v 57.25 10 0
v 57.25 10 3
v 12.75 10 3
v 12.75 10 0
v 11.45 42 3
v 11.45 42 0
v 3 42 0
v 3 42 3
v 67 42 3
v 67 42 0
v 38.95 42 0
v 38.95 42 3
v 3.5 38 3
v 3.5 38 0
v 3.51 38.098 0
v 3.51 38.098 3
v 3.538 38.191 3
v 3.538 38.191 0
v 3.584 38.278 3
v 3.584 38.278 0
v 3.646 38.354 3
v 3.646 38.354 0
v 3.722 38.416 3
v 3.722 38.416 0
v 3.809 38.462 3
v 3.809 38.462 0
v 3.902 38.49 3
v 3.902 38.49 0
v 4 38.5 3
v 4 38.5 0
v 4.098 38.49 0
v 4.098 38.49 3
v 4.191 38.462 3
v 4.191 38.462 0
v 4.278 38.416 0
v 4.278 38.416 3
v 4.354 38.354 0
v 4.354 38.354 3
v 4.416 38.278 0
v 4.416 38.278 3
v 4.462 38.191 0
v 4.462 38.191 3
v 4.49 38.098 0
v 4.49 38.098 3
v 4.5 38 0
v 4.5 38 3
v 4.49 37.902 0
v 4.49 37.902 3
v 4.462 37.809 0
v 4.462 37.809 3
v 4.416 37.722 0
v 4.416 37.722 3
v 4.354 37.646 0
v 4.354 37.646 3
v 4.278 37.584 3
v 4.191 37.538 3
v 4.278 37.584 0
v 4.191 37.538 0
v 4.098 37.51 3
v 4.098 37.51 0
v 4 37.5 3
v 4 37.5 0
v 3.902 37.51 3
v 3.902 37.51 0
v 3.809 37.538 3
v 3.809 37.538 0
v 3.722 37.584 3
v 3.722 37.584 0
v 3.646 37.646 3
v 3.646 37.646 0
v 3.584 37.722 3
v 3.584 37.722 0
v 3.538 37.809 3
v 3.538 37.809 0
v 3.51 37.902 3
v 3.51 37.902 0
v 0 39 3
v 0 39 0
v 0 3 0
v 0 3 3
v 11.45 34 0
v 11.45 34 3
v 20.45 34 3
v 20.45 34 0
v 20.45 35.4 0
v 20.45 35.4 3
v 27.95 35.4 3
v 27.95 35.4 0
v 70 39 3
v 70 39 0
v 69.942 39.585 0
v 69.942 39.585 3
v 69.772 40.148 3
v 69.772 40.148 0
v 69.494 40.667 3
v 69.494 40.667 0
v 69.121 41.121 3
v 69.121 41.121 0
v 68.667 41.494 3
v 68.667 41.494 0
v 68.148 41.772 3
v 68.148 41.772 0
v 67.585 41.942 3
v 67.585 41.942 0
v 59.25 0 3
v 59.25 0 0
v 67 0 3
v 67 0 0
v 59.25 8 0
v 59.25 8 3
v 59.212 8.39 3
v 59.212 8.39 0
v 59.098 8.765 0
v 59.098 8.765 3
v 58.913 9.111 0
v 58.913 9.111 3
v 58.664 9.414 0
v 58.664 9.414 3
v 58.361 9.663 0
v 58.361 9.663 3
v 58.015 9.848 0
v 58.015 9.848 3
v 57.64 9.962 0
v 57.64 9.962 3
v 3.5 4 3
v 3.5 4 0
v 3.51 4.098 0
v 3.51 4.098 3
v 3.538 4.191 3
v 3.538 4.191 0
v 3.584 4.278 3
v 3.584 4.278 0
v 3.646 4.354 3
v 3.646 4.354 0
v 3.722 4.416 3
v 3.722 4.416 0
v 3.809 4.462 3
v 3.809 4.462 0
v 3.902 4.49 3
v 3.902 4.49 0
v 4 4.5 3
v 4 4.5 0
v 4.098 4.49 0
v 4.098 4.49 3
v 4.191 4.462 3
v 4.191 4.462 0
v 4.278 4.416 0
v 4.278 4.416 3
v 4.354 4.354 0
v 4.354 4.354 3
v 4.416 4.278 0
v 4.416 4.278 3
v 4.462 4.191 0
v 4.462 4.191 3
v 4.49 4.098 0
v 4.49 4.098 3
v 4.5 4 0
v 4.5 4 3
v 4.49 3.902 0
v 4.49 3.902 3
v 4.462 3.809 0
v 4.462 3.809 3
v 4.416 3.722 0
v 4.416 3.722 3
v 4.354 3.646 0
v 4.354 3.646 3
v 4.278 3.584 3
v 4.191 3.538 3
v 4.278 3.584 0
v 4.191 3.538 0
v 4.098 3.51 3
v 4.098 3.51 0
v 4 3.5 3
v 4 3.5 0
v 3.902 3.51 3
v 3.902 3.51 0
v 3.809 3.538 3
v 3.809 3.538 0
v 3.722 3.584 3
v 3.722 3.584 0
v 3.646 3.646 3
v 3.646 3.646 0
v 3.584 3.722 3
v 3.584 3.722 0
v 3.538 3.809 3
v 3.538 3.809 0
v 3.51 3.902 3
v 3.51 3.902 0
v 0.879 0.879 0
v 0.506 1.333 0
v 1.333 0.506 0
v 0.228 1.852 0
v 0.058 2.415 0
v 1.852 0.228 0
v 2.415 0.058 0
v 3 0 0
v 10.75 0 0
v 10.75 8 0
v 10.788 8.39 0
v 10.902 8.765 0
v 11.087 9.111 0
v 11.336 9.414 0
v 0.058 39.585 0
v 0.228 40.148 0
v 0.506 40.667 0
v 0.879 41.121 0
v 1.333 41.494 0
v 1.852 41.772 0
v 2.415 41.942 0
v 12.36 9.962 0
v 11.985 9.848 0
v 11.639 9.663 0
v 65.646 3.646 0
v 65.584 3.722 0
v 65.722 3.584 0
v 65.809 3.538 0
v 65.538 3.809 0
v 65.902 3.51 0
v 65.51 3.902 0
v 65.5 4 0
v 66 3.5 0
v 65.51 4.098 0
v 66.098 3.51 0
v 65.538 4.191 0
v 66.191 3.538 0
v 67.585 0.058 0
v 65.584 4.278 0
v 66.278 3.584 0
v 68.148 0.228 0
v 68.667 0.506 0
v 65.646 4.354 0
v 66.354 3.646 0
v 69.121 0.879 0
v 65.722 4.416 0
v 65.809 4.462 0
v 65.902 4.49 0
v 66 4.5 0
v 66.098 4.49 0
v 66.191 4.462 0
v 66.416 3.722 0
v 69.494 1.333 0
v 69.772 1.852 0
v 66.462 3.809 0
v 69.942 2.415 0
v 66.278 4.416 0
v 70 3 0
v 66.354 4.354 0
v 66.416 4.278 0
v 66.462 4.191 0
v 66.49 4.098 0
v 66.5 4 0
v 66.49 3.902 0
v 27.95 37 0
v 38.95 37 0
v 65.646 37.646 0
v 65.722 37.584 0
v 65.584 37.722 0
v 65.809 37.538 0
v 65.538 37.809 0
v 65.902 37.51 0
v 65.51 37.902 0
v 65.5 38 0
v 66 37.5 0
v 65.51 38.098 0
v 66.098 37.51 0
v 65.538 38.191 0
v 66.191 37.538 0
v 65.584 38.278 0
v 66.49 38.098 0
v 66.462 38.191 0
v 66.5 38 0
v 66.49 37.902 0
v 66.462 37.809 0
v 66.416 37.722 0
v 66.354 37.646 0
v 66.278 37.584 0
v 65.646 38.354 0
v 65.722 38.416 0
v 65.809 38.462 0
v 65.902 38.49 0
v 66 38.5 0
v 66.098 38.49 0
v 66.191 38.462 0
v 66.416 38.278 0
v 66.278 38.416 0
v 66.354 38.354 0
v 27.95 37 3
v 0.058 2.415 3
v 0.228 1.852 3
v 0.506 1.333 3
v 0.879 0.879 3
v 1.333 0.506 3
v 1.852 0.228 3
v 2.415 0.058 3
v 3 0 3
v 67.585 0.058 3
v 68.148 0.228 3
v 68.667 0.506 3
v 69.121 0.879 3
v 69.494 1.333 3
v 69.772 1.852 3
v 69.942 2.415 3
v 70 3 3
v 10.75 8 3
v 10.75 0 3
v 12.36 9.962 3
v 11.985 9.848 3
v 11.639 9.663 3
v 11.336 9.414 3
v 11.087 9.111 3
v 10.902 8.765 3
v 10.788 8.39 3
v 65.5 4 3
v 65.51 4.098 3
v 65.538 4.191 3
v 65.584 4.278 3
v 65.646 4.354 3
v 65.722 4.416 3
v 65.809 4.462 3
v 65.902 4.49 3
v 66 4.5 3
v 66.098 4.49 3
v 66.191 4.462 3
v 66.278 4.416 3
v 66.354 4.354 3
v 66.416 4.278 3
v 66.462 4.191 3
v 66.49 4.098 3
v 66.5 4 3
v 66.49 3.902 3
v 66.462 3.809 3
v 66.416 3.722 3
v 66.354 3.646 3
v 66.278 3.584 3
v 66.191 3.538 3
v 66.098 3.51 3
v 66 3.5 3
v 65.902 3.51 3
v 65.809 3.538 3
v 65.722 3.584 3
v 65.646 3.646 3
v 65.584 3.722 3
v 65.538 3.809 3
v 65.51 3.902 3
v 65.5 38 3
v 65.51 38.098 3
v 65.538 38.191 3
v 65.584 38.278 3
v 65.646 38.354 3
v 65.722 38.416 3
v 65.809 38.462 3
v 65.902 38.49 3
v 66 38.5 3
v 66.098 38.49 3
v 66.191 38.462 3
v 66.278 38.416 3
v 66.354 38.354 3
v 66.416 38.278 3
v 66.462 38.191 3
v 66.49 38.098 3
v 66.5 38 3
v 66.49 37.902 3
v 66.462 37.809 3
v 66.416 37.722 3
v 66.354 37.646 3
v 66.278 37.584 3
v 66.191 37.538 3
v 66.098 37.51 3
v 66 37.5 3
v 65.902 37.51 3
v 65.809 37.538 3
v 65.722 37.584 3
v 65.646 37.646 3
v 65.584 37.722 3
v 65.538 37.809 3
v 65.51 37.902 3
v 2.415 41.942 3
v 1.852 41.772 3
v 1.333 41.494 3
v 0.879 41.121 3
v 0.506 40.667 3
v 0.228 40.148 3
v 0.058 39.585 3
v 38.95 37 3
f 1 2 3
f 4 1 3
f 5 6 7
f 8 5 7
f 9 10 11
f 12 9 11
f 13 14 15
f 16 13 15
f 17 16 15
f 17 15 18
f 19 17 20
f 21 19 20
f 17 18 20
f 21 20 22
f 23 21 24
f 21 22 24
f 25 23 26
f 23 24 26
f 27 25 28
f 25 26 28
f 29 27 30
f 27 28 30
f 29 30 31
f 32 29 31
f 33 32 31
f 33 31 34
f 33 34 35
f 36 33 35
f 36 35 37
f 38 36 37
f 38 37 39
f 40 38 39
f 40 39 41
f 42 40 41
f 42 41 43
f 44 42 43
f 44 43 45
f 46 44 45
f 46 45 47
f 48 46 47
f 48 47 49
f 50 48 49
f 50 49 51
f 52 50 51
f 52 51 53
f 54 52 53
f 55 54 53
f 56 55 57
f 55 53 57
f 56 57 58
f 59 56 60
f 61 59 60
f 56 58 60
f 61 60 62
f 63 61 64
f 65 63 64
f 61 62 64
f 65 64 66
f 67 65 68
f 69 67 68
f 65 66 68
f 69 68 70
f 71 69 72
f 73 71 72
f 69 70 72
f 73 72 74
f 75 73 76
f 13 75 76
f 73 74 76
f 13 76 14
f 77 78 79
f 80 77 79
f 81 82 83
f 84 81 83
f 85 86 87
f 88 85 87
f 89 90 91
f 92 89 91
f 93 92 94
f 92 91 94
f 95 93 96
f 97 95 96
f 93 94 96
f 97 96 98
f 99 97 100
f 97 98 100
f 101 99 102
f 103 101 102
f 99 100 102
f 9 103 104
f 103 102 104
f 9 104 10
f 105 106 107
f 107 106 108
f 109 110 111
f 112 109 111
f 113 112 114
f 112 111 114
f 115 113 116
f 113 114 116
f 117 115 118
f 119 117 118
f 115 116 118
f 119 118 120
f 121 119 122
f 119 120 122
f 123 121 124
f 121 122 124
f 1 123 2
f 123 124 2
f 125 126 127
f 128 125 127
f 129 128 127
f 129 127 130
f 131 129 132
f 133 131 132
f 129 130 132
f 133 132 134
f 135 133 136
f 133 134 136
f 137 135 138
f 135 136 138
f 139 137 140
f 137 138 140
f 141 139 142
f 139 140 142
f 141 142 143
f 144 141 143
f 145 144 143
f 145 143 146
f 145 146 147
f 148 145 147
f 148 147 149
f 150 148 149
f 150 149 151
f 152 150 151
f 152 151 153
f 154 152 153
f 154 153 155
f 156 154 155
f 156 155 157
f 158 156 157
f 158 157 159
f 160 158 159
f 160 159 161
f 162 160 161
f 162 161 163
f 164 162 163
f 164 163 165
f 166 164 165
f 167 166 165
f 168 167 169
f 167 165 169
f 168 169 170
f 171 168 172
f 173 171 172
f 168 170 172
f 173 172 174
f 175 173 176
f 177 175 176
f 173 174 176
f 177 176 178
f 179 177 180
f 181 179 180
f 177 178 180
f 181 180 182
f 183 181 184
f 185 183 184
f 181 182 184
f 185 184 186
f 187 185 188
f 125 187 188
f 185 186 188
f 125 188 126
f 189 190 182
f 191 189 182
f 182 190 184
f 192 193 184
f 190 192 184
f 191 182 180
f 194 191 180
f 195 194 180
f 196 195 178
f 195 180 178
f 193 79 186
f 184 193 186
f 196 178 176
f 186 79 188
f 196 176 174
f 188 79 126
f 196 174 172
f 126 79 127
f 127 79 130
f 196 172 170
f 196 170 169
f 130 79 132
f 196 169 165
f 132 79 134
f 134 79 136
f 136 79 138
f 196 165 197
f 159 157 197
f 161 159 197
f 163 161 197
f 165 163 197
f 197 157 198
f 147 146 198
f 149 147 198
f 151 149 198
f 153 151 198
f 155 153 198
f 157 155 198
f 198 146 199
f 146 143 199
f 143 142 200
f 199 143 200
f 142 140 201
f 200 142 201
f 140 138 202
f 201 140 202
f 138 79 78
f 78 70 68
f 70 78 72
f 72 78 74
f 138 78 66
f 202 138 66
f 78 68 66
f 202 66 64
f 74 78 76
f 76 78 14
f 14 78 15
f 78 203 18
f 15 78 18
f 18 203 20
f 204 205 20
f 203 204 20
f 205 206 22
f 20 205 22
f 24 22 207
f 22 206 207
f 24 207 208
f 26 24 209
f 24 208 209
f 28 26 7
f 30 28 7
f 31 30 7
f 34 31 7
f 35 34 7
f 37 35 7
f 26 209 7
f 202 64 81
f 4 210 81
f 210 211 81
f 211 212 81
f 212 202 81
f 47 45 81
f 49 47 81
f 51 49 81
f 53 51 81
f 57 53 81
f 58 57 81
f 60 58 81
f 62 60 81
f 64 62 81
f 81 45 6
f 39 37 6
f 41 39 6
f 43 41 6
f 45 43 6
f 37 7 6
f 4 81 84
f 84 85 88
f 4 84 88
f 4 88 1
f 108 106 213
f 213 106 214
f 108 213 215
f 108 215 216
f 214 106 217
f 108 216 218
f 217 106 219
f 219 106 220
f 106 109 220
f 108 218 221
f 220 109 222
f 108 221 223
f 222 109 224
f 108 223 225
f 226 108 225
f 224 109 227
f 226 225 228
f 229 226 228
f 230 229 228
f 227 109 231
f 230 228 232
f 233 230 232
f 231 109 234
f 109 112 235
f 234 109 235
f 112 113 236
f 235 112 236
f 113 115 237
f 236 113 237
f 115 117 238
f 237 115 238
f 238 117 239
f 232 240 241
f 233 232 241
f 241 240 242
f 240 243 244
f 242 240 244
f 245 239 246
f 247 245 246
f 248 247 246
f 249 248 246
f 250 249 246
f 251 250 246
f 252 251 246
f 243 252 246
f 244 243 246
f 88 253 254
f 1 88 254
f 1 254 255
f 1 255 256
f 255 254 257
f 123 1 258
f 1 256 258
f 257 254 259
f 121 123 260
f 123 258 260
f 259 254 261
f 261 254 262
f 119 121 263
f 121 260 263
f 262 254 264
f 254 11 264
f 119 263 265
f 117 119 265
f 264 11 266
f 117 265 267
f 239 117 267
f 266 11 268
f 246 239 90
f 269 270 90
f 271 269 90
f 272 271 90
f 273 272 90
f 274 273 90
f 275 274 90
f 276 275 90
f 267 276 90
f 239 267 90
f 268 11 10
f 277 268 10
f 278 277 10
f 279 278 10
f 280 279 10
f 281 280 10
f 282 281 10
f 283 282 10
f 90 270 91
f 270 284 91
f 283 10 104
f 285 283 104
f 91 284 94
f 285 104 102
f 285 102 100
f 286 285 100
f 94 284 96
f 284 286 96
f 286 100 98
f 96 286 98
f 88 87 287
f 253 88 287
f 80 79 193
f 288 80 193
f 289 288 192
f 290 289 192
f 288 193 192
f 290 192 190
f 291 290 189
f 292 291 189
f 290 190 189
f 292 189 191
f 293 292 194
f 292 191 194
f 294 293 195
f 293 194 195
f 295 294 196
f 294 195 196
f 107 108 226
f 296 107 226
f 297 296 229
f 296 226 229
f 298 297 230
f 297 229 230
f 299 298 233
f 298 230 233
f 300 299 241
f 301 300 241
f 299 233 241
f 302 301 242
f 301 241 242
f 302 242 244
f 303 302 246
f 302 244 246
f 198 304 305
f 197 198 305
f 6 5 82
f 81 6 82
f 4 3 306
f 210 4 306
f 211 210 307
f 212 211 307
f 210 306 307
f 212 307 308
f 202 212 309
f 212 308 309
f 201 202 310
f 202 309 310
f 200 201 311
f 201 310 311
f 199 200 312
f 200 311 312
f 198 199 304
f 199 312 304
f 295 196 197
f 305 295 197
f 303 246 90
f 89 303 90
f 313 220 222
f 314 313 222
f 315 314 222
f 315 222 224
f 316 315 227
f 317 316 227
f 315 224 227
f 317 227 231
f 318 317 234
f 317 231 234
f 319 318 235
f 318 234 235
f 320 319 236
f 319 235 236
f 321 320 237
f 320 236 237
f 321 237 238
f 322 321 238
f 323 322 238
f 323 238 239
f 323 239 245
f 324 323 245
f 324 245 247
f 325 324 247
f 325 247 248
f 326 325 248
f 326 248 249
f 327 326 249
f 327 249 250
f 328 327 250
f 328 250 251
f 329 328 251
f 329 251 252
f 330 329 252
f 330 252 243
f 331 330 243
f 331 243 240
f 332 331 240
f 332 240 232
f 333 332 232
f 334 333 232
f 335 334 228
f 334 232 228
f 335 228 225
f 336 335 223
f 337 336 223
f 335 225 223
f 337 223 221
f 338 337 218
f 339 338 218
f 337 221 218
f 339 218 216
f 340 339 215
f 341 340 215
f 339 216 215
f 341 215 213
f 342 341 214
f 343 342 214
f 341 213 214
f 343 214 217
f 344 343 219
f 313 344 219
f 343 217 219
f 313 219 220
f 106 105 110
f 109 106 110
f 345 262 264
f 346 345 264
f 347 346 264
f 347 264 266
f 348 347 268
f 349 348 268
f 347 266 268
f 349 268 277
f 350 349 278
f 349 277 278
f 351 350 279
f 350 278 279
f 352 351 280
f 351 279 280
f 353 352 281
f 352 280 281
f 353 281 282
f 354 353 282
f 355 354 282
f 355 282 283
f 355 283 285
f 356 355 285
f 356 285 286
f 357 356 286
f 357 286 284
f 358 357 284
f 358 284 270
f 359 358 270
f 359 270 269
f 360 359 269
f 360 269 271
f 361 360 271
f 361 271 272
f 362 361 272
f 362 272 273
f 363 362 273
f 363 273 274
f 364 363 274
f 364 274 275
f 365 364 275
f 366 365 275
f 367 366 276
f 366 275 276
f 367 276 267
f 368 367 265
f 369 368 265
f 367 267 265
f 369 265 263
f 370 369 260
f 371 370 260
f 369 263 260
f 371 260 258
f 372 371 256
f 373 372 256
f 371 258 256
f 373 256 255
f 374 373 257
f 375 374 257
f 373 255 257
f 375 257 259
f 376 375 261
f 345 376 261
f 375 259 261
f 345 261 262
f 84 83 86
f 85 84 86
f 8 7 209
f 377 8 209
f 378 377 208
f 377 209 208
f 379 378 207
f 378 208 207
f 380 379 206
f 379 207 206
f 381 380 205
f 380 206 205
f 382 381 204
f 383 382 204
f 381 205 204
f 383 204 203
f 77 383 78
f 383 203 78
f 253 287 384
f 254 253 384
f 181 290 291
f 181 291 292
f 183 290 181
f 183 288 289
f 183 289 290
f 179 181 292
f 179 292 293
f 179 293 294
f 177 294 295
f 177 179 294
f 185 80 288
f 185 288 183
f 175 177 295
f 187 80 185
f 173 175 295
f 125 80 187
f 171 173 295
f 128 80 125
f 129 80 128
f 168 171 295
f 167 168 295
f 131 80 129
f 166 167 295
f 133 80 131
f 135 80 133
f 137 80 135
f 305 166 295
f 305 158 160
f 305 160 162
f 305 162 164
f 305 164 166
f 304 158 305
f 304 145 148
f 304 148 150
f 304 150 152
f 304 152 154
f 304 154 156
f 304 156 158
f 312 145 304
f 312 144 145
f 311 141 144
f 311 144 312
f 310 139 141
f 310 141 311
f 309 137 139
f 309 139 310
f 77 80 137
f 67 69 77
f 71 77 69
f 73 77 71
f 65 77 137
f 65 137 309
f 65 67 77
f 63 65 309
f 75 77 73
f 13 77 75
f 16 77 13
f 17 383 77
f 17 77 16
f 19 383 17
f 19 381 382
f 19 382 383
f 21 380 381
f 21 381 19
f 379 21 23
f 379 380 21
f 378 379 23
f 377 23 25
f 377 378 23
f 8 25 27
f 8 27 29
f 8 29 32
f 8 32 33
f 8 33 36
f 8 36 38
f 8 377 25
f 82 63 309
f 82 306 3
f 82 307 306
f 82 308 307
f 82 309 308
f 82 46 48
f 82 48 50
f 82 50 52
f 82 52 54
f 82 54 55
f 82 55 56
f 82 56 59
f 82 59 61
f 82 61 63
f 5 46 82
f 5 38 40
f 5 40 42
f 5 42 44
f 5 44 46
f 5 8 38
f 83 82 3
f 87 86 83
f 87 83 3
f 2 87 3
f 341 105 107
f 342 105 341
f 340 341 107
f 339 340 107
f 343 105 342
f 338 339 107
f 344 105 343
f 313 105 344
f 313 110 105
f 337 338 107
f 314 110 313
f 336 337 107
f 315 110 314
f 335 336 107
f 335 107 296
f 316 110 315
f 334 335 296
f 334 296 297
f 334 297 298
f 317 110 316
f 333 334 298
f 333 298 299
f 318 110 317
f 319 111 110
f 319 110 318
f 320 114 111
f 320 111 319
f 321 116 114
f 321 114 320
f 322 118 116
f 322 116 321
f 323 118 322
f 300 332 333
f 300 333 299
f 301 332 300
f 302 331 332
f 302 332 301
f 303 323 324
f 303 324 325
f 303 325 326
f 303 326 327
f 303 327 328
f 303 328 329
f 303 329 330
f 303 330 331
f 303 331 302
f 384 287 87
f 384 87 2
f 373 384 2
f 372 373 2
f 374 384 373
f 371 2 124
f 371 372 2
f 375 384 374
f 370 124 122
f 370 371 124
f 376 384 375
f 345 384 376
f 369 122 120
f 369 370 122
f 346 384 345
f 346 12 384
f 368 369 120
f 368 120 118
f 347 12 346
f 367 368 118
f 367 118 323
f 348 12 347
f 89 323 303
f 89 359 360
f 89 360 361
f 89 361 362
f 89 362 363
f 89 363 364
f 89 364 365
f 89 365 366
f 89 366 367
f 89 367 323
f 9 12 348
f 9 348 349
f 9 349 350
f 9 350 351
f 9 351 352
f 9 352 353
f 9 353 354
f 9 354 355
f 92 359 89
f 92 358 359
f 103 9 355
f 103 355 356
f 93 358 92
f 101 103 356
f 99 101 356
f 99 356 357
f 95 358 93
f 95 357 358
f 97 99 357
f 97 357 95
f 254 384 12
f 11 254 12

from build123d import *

# Parameters (mm, degrees)
F1_DEPTH = 3
F3_DEPTH = 3.001
F5_DEPTH = 3.001
F7_D     = 1


with BuildPart() as f1:
    # F0 (on Top) → F1 (new body)
    with BuildSketch(Plane.XY):
        with BuildLine():
            ThreePointArc((0, 3), (0.87868, 0.87868), (3, 0))
            Line((3, 0), (67, 0))
            ThreePointArc((67, 0), (69.12132, 0.87868), (70, 3))
            Line((70, 3), (70, 39))
            ThreePointArc((70, 39), (69.12132, 41.12132), (67, 42))
            Line((67, 42), (3, 42))
            ThreePointArc((3, 42), (0.87868, 41.12132), (0, 39))
            Line((0, 39), (0, 3))
        make_face()
    extrude(amount=F1_DEPTH)

    # F2 (on face) → F3 (cut, through all)
    with BuildSketch(Plane.XY.offset(3)):
        with BuildLine():
            Line((57.25, 10), (12.75, 10))
            ThreePointArc((12.75, 10), (11.335786, 9.414214), (10.75, 8))
            Line((10.75, 8), (10.75, 0))
            Line((10.75, 0), (59.25, 0))
            Line((59.25, 0), (59.25, 8))
            ThreePointArc((59.25, 8), (58.664214, 9.414214), (57.25, 10))
        make_face()
    extrude(amount=-F3_DEPTH, mode=Mode.SUBTRACT)

    # F4 (on face) → F5 (cut, through all)
    with BuildSketch(Plane.XY.offset(3)):
        Polygon((38.95, 37), (38.95, 42), (18.4, 42), (11.45, 42), (11.45, 34), (20.45, 34), (20.45, 35.4), (27.95, 35.4), (27.95, 37), align=None)
    extrude(amount=-F5_DEPTH, mode=Mode.SUBTRACT)

    # F7 (through all)
    with Locations(Plane.XY.offset(3)):
        with Locations((4, 38), (66, 38), (66, 4), (4, 4)):
            Hole(F7_D / 2)


solid = f1.part
